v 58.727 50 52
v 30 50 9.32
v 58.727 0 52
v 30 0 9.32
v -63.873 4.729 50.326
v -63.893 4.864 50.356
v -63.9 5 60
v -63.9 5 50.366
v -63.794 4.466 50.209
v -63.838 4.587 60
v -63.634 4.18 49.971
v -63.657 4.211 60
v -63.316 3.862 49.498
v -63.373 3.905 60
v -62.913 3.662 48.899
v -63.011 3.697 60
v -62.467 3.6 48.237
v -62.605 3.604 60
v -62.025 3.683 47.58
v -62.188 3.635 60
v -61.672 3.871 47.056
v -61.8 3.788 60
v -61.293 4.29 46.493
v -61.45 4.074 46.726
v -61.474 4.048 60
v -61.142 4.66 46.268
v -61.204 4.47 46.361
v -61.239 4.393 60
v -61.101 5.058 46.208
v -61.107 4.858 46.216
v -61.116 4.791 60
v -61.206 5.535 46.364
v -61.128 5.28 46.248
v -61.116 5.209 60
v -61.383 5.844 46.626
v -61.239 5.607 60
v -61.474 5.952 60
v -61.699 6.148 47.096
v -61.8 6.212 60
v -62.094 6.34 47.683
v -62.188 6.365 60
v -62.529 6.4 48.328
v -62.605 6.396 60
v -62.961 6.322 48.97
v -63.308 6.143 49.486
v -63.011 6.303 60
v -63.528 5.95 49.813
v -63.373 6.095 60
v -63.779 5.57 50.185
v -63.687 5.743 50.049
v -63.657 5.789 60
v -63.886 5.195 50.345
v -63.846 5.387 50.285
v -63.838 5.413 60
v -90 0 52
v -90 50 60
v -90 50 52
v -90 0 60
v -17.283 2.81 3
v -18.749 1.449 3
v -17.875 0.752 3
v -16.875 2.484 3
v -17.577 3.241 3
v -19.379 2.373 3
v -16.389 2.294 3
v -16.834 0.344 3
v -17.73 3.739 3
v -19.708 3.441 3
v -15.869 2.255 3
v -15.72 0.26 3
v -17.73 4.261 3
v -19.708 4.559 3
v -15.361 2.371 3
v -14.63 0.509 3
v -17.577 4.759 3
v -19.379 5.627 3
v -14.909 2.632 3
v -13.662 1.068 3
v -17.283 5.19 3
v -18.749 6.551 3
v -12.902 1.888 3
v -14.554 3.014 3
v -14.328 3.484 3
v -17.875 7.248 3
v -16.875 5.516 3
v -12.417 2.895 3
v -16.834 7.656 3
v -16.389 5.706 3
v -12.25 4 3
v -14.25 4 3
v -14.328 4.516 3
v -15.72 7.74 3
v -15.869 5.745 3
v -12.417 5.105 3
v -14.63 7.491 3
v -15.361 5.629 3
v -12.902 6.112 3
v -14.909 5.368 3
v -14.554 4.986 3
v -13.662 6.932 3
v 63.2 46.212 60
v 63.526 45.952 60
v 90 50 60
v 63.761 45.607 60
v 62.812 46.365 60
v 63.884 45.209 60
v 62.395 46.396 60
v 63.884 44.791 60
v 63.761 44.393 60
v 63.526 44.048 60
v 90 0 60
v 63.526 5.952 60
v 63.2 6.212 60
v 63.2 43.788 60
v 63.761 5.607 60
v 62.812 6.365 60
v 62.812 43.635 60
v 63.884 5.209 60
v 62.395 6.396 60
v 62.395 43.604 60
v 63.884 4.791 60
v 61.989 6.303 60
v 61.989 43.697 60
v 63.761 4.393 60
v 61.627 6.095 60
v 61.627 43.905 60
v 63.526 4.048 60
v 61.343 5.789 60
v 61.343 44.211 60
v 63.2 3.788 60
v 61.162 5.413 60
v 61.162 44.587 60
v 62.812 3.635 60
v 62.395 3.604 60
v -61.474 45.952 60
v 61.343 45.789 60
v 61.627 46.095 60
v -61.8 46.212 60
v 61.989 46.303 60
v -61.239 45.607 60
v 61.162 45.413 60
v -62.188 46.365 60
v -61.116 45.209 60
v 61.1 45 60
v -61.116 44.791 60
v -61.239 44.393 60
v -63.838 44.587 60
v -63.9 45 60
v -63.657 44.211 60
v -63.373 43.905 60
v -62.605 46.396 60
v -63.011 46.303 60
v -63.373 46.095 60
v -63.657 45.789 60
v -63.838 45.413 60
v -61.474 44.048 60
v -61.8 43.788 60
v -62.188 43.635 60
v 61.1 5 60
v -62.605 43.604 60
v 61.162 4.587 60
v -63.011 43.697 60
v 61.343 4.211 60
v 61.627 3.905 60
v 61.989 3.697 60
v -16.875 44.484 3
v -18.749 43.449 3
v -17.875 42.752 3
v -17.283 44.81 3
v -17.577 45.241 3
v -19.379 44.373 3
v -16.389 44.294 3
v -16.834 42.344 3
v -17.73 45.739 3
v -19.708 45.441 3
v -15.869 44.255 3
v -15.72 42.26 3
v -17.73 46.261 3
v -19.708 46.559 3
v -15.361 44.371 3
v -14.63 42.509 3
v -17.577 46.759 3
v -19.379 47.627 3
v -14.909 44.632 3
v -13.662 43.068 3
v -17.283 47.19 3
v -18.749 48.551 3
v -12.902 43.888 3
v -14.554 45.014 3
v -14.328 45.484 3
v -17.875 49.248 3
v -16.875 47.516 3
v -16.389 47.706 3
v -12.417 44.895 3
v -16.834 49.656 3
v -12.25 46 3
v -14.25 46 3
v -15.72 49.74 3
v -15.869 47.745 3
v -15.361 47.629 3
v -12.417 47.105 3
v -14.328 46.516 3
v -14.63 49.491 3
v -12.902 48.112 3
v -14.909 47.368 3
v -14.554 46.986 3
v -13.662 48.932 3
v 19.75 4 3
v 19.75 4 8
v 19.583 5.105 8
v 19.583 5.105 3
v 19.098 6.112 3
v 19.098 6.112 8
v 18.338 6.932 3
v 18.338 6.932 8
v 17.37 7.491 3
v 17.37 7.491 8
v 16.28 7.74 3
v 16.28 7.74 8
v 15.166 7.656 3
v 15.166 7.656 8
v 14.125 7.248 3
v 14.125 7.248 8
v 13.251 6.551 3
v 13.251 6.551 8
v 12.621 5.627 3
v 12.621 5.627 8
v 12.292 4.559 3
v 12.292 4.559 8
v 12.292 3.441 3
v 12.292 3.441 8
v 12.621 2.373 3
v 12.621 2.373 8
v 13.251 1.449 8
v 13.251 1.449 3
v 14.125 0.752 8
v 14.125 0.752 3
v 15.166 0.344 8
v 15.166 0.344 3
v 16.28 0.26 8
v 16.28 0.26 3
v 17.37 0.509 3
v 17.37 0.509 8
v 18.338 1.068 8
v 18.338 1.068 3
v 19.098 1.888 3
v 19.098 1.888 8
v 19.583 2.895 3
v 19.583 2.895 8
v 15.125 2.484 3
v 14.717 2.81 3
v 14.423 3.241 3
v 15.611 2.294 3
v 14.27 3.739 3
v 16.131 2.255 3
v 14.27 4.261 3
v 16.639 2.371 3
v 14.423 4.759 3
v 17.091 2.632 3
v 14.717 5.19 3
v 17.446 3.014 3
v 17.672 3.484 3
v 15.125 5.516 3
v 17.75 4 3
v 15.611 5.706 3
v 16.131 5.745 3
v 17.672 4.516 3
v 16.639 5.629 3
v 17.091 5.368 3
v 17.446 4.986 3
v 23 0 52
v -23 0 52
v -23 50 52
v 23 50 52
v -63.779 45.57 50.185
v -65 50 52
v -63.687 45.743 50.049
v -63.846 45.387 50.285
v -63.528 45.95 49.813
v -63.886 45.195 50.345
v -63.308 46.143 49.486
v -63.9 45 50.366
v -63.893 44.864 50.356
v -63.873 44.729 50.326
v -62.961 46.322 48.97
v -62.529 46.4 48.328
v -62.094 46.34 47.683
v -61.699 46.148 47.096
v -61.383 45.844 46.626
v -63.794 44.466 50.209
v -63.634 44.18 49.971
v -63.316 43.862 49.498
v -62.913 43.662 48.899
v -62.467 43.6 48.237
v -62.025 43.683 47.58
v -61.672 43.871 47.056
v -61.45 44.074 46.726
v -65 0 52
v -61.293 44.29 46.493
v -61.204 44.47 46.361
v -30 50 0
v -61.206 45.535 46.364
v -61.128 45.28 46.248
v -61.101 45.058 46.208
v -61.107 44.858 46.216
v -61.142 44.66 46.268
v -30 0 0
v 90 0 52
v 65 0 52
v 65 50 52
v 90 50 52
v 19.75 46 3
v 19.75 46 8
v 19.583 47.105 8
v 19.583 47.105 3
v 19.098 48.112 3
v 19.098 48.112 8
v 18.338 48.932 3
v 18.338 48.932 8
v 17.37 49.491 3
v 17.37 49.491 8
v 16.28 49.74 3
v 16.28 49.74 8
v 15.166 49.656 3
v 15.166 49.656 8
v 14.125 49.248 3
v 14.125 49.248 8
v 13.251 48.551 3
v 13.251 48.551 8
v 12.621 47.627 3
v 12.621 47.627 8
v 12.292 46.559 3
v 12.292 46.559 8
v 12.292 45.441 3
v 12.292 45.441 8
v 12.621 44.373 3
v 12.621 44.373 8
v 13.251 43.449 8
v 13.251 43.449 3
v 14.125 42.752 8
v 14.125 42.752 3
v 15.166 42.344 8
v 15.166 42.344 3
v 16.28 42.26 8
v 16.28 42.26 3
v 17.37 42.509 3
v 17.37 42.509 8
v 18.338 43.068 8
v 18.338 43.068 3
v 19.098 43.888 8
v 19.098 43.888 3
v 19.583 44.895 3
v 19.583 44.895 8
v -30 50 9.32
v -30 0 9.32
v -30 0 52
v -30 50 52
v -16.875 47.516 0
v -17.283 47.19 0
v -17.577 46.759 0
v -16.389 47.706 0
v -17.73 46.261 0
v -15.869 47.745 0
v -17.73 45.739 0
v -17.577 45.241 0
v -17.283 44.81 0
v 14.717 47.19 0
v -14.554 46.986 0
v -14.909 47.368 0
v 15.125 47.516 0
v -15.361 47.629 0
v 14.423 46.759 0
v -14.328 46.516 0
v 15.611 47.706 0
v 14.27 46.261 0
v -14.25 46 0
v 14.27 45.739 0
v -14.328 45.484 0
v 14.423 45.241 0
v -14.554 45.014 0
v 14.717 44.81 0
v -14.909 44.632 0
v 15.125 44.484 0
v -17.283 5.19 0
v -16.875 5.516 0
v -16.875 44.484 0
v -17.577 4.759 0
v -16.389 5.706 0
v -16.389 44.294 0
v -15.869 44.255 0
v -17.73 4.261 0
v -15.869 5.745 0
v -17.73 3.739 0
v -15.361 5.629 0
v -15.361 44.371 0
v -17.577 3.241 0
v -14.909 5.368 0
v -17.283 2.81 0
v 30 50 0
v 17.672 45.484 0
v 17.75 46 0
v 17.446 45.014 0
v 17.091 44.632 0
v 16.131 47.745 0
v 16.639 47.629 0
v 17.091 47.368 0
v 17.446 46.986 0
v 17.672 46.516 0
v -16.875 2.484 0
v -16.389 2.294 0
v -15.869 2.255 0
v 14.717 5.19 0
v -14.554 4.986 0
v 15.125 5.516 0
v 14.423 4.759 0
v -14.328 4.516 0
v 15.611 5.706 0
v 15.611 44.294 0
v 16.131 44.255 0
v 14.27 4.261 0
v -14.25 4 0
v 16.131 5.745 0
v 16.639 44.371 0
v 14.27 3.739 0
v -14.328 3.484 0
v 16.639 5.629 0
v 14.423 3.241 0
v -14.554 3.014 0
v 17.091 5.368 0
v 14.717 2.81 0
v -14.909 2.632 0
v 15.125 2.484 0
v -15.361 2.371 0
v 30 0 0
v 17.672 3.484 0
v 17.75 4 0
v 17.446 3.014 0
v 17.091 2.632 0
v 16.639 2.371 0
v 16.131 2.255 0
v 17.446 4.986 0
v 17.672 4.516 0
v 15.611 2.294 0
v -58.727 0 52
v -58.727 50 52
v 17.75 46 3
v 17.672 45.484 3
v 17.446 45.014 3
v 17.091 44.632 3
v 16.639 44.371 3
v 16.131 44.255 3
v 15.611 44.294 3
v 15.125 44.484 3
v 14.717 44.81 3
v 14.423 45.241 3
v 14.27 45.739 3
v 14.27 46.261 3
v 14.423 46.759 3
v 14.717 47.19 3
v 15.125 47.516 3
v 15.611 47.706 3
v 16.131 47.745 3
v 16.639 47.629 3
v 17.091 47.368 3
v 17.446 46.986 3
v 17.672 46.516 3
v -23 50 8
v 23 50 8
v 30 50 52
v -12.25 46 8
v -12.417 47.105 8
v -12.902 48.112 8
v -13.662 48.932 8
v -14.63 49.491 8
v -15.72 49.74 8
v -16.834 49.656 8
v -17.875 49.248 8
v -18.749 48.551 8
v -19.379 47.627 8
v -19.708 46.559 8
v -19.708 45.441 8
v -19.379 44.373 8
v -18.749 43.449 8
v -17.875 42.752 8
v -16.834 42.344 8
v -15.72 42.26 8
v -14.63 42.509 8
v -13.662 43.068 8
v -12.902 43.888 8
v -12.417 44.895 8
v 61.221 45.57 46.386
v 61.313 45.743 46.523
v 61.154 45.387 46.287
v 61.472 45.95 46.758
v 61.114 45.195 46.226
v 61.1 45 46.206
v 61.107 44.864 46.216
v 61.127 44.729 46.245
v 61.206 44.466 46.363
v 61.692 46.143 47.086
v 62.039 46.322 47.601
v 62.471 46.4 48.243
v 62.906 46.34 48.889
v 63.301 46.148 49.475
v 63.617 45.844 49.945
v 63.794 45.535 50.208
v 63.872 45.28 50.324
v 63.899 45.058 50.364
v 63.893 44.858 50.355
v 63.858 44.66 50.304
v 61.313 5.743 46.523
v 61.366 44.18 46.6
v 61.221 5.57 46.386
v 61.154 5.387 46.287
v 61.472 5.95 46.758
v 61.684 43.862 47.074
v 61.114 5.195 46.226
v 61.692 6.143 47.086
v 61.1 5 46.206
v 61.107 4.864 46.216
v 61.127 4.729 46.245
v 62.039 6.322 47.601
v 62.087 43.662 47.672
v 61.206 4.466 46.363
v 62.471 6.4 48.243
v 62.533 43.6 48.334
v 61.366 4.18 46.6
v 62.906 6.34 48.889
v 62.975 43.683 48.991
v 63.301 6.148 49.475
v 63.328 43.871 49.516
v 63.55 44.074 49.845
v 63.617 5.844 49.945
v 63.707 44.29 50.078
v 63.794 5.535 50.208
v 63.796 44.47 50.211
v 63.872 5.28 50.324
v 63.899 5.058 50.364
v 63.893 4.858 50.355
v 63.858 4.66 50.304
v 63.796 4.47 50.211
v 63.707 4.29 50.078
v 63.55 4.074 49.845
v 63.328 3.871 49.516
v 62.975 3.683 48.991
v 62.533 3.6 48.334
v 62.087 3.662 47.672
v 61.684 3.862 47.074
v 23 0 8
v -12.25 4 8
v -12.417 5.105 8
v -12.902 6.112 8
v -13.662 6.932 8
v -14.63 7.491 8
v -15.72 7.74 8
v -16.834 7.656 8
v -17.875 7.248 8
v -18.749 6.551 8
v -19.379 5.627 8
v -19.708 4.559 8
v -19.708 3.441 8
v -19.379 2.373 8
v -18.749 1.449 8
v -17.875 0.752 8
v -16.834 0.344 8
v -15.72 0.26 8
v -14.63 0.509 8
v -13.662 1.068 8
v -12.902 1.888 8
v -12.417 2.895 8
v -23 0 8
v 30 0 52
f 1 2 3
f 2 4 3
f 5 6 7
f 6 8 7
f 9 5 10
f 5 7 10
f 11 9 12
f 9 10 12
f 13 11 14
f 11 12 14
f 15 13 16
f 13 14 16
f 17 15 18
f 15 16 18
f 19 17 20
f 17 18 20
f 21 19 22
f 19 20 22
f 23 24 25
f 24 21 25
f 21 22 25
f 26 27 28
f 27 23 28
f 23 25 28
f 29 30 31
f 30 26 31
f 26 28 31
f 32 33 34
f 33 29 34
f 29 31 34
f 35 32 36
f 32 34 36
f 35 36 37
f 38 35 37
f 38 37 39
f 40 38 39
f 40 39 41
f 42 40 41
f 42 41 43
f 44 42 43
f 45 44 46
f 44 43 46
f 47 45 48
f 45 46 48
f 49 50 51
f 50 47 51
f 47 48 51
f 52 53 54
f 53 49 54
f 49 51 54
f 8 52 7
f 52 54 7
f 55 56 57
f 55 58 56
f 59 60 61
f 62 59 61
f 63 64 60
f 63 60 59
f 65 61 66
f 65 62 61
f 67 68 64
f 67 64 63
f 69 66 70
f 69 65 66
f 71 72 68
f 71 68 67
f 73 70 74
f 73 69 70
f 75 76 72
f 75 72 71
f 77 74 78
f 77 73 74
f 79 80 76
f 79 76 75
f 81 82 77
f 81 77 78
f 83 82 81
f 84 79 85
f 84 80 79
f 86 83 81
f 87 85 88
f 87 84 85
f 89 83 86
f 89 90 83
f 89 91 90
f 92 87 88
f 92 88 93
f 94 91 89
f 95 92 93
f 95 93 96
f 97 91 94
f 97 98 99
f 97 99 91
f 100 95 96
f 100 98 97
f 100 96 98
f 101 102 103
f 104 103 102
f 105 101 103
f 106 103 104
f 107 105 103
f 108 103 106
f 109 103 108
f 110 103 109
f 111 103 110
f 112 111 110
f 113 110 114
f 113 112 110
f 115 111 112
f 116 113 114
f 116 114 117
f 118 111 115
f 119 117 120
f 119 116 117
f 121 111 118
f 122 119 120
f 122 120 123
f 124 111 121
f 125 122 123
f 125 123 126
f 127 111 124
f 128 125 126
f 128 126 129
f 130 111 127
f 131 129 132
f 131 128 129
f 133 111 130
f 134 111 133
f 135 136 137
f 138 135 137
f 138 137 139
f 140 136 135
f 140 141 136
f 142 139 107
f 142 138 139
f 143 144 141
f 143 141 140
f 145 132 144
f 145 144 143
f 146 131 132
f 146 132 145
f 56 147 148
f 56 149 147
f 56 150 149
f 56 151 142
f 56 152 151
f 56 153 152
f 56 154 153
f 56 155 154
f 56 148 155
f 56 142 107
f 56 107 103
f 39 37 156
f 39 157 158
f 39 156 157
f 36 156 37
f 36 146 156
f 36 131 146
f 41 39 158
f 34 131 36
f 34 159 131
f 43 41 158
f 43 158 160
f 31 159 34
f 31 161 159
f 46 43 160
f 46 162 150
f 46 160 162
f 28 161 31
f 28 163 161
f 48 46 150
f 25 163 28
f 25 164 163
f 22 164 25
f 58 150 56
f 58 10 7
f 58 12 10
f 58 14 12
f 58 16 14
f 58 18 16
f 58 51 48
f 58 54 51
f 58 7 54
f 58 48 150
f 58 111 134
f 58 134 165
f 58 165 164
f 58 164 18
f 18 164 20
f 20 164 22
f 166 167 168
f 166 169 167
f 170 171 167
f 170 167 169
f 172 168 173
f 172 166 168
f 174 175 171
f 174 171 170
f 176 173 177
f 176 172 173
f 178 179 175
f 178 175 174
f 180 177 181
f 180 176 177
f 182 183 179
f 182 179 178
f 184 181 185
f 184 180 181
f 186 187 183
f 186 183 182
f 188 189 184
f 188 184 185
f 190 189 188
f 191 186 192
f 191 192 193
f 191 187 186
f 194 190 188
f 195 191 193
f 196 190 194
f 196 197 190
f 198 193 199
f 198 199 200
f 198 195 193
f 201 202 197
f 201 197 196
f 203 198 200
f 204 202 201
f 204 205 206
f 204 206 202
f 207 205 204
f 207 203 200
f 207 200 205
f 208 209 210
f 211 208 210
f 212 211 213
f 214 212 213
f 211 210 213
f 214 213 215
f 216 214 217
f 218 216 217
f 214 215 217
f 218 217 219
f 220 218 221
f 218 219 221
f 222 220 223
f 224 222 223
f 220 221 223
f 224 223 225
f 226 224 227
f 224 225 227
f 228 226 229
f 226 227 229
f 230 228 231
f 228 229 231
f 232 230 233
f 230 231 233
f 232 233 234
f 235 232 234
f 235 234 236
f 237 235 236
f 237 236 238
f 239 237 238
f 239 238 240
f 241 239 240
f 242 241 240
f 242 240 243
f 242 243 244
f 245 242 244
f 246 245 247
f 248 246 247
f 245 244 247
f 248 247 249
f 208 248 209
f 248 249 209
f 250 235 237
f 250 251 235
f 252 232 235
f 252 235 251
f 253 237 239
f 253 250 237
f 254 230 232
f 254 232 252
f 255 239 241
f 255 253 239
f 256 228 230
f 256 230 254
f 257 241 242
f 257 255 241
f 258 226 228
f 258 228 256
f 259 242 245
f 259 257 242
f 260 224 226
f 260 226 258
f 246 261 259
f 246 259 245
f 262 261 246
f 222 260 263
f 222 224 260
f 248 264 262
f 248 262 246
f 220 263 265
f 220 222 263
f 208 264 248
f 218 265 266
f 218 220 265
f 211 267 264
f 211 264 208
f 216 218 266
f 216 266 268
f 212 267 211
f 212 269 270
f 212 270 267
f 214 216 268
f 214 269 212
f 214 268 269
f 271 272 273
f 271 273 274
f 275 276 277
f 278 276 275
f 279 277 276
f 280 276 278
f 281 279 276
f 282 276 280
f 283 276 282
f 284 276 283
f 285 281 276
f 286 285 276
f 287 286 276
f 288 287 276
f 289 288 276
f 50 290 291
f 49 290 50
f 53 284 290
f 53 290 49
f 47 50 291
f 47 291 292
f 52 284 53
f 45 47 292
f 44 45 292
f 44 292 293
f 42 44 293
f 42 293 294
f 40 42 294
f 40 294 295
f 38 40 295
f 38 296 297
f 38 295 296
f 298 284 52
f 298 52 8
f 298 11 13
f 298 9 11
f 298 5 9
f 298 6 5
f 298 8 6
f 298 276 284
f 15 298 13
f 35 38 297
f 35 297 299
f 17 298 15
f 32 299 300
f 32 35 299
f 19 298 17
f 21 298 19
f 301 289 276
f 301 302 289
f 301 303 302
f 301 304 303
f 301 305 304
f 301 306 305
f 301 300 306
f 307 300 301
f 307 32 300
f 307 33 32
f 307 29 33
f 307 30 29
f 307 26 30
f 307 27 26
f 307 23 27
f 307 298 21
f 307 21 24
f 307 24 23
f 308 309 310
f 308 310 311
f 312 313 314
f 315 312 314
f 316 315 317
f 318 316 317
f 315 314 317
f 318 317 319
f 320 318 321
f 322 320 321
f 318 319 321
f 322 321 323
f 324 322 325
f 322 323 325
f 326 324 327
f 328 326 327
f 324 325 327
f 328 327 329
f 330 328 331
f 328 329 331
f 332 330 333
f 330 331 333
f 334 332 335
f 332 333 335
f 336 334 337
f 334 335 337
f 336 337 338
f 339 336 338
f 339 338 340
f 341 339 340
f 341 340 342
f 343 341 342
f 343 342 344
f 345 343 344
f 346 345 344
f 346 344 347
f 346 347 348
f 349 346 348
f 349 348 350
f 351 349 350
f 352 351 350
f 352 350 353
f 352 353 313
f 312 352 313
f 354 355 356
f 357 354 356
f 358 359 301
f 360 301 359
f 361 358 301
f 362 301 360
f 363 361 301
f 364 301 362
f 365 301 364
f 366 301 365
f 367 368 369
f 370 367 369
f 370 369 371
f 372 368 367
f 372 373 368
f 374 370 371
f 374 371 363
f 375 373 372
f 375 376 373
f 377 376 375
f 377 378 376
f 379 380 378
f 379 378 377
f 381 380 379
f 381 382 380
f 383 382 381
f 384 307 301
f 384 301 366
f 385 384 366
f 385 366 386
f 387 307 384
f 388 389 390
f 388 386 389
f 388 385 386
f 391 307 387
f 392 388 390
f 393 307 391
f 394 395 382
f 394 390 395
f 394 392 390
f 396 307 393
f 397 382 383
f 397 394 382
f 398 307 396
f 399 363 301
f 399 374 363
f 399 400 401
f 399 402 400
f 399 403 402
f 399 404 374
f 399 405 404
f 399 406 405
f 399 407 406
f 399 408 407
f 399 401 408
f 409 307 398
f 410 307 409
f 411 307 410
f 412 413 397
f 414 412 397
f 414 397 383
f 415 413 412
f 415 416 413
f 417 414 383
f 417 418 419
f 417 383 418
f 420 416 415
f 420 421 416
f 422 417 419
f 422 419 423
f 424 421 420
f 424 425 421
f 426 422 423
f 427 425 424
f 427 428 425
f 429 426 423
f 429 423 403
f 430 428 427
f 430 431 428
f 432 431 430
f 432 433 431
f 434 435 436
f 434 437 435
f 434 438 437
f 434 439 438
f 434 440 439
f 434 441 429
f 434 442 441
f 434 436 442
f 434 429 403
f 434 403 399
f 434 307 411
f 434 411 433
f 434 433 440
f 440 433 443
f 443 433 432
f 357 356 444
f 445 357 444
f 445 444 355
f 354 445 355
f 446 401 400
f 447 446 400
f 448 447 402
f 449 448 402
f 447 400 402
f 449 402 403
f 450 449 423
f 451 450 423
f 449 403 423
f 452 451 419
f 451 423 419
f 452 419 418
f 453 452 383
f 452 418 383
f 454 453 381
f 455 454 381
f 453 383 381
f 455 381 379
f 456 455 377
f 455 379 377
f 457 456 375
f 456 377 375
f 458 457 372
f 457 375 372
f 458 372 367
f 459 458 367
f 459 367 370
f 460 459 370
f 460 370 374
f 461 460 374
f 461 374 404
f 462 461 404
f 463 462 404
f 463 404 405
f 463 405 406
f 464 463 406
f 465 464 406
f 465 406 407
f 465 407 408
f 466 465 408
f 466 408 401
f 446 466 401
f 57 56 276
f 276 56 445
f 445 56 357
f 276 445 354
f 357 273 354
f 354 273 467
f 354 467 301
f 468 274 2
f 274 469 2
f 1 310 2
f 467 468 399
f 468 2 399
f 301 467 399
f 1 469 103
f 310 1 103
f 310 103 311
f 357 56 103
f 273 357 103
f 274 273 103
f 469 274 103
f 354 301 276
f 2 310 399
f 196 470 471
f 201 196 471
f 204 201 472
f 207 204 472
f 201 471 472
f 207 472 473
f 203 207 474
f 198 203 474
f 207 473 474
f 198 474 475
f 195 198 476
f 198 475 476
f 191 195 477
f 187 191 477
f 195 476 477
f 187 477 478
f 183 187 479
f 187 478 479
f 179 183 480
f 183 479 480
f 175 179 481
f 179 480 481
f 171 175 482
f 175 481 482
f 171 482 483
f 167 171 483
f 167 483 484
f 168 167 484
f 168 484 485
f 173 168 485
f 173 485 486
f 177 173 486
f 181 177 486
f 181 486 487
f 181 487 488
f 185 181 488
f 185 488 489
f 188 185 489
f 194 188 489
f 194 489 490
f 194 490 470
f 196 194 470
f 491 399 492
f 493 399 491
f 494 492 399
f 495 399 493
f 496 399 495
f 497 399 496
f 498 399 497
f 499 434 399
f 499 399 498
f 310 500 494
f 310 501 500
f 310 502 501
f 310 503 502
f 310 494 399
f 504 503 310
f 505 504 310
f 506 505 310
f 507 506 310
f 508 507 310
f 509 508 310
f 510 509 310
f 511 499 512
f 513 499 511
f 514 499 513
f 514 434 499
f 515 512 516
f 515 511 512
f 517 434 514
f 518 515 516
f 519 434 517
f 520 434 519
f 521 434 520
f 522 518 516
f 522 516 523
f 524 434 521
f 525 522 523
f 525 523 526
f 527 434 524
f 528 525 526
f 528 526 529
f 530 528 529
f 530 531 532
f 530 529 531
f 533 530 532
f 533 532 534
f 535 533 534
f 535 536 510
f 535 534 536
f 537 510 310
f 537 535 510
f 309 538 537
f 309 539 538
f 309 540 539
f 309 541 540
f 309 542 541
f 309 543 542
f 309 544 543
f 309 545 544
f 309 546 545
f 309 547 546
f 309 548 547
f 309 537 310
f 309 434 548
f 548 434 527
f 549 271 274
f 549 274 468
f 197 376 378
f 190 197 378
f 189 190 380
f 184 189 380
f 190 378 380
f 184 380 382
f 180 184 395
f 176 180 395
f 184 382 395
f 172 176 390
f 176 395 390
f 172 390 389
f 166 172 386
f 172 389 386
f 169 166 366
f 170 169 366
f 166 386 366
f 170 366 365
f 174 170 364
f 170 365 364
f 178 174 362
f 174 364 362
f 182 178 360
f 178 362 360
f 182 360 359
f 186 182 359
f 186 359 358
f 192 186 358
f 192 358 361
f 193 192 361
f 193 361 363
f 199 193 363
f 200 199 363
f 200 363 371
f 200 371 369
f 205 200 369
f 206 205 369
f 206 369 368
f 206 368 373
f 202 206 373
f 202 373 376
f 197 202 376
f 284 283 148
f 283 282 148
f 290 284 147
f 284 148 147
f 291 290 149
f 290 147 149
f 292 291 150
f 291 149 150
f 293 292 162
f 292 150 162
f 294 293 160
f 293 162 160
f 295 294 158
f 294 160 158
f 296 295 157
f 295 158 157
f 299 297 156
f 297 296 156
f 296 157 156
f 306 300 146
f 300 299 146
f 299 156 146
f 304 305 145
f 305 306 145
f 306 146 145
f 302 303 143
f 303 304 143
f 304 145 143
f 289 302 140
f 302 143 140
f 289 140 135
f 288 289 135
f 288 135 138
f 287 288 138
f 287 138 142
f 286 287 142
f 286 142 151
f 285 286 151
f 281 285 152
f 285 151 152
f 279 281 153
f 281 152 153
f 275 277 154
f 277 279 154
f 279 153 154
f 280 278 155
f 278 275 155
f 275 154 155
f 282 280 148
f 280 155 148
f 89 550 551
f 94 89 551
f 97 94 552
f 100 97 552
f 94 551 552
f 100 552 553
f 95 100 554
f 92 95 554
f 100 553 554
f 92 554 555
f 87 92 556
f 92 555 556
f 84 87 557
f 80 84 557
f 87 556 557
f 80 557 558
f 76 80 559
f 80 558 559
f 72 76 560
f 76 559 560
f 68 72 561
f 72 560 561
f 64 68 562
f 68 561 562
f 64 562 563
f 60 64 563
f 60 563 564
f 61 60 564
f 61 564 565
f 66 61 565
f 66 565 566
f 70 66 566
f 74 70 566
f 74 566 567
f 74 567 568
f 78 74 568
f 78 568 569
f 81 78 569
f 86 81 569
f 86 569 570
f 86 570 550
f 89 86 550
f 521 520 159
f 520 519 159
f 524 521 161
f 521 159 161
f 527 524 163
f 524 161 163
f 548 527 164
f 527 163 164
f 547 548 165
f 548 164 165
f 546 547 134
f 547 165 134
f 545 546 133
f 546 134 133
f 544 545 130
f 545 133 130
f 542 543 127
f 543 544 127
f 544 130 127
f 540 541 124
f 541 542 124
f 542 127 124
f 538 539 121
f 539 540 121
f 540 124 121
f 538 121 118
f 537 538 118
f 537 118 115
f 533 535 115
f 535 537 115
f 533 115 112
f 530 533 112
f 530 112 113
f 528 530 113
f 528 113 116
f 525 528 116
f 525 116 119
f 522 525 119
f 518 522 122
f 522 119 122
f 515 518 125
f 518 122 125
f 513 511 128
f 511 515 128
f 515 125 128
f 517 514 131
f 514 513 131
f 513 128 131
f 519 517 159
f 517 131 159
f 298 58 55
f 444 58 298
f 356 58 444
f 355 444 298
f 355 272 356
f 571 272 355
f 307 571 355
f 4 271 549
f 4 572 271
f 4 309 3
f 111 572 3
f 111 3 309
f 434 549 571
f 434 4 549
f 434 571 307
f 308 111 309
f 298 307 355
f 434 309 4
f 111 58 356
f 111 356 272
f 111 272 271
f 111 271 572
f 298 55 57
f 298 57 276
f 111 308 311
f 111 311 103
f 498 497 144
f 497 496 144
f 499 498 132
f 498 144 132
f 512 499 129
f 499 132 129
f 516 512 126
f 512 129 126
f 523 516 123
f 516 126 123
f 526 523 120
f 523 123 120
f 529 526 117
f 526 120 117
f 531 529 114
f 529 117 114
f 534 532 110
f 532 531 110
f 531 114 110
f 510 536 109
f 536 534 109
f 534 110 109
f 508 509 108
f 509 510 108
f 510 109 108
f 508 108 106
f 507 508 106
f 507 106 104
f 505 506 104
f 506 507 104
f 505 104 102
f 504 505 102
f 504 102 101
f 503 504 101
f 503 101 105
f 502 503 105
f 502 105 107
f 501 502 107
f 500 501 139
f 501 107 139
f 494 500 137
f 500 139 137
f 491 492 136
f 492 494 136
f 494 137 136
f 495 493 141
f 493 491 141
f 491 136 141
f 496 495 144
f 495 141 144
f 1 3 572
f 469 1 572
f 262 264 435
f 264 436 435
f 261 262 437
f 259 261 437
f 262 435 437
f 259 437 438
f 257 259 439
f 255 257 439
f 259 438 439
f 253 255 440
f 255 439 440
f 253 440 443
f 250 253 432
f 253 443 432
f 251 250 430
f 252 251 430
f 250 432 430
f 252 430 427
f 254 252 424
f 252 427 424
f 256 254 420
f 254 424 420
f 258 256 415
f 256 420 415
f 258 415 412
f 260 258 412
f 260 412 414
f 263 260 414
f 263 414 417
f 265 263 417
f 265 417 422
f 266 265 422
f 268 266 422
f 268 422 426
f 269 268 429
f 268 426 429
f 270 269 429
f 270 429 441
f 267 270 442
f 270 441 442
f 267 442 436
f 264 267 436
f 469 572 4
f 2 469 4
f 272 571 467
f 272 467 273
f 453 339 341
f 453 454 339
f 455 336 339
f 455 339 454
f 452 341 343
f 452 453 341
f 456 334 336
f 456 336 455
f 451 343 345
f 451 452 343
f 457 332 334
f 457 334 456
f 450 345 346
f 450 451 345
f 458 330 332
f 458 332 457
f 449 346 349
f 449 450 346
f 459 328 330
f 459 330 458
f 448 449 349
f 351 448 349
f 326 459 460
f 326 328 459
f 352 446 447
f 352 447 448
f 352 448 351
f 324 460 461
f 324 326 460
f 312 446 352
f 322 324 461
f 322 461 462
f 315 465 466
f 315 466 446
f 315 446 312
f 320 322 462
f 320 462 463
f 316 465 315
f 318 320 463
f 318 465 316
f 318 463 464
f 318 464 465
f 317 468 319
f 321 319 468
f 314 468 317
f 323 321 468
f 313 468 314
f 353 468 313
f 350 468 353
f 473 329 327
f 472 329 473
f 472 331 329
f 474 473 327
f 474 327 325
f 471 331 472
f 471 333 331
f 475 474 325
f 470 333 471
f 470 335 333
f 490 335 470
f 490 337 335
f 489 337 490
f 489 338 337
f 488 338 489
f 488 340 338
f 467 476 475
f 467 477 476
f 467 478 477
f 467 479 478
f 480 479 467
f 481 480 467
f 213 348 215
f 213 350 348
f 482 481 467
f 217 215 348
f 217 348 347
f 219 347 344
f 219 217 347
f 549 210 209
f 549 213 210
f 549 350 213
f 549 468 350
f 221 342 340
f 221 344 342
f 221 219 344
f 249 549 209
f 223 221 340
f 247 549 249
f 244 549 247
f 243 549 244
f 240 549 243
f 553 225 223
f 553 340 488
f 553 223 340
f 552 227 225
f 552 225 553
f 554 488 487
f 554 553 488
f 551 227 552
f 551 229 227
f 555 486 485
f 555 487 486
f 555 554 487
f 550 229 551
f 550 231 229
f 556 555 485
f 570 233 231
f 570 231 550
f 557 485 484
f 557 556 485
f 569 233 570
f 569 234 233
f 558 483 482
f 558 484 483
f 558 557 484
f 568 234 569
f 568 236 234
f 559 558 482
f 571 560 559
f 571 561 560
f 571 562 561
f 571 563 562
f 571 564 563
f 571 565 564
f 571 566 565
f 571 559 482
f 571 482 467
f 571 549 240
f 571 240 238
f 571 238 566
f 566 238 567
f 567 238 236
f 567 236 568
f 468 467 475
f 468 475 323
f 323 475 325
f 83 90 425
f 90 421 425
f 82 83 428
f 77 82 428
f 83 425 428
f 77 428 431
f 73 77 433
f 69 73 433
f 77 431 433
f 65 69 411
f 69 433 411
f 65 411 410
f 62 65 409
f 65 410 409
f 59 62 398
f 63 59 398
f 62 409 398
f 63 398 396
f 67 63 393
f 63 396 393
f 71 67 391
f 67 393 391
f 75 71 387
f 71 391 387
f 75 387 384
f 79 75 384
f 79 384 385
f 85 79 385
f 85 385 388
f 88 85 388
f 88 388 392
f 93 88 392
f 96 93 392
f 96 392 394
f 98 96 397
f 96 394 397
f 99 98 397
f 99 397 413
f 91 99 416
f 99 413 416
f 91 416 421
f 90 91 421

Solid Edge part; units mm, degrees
sketch "Sketch1" plane through (0, 0, 0) normal (0, -1, 0) x (1, 0, 0)
  line L0 (30, 0) -> (65, 52)
  line L1 (65, 52) -> (90, 52)
  line L2 (90, 52) -> (90, 60)
  line L3 (90, 60) -> (56.9204, 60)
  line L4 (56.9204, 60) -> (0, 60)
  line L5 (0, 60) -> (0, 52)
  line L6 (0, 52) -> (23, 52)
  line L7 (23, 52) -> (23, 8)
  line L8 (23, 8) -> (0, 8)
  line L9 (0, 8) -> (0, 0)
  line L10 (0, 0) -> (30, 0)
  dimension "D1" = 8
  dimension "D2" = 30
  dimension "D3" = 23
  dimension "D4" = 8
  dimension "D5" = 60
  dimension "D6" = 65
extrude "Protrusion1" add sketch "Sketch1" against normal blind 50
mirror "Mirror1" about plane through (0, 25, 4) normal (-1, 0, 0) of "Protrusion1"
sketch "Sketch2" plane through (0, 0, 26) normal (0, -1, 0) x (1, 0, 0)
  line L0 (30, -16.6796) -> (58.7267, 26)
  line L1 (58.7267, 26) -> (30, 26)
  line L2 (30, 26) -> (30, -16.6796)
extrude "Cutout1" cut sketch "Sketch2" against normal through all
sketch "Sketch3" plane through (0, 25, 0) normal (0, 0, -1) x (1, 0, 0)
  circle A0 centre (-16, 21) radius 1.75
  circle A1 centre (16, 21) radius 1.75
  circle A2 centre (16, -21) radius 1.75
  circle A3 centre (-16, -21) radius 1.75
  dimension "D1" = 3.5
  dimension "D2" = 32
  dimension "D3" = 42
extrude "Cutout2" cut sketch "Sketch3" against normal up to next
sketch "Sketch4" plane through (0, 25, 8) normal (0, 0, 1) x (1, 0, 0)
  circle A0 centre (-16, -21) radius 3.75
  circle A1 centre (16, -21) radius 3.75
  circle A2 centre (-16, 21) radius 3.75
  circle A3 centre (16, 21) radius 3.75
  dimension "D1" = 7.5
extrude "Extrusionsausschnitt_4" cut sketch "Sketch4" against normal blind 5
sketch "Sketch5" plane through (0, 25, 60) normal (0, 0, 1) x (-1, 0, 0)
  circle A0 centre (-62.5, 20) radius 1.4
  circle A1 centre (-62.5, -20) radius 1.4
  circle A2 centre (62.5, -20) radius 1.4
  circle A3 centre (62.5, 20) radius 1.4
  dimension "D1" = 125
  dimension "D2" = 40
  dimension "D3" = 2.8
extrude "Cutout3" cut sketch "Sketch5" against normal through all
mirror "Mirror2" about plane through (0, 0, 0) normal (1, 0, 0) of "Cutout1"
properties material "Nylon, allgemein"
